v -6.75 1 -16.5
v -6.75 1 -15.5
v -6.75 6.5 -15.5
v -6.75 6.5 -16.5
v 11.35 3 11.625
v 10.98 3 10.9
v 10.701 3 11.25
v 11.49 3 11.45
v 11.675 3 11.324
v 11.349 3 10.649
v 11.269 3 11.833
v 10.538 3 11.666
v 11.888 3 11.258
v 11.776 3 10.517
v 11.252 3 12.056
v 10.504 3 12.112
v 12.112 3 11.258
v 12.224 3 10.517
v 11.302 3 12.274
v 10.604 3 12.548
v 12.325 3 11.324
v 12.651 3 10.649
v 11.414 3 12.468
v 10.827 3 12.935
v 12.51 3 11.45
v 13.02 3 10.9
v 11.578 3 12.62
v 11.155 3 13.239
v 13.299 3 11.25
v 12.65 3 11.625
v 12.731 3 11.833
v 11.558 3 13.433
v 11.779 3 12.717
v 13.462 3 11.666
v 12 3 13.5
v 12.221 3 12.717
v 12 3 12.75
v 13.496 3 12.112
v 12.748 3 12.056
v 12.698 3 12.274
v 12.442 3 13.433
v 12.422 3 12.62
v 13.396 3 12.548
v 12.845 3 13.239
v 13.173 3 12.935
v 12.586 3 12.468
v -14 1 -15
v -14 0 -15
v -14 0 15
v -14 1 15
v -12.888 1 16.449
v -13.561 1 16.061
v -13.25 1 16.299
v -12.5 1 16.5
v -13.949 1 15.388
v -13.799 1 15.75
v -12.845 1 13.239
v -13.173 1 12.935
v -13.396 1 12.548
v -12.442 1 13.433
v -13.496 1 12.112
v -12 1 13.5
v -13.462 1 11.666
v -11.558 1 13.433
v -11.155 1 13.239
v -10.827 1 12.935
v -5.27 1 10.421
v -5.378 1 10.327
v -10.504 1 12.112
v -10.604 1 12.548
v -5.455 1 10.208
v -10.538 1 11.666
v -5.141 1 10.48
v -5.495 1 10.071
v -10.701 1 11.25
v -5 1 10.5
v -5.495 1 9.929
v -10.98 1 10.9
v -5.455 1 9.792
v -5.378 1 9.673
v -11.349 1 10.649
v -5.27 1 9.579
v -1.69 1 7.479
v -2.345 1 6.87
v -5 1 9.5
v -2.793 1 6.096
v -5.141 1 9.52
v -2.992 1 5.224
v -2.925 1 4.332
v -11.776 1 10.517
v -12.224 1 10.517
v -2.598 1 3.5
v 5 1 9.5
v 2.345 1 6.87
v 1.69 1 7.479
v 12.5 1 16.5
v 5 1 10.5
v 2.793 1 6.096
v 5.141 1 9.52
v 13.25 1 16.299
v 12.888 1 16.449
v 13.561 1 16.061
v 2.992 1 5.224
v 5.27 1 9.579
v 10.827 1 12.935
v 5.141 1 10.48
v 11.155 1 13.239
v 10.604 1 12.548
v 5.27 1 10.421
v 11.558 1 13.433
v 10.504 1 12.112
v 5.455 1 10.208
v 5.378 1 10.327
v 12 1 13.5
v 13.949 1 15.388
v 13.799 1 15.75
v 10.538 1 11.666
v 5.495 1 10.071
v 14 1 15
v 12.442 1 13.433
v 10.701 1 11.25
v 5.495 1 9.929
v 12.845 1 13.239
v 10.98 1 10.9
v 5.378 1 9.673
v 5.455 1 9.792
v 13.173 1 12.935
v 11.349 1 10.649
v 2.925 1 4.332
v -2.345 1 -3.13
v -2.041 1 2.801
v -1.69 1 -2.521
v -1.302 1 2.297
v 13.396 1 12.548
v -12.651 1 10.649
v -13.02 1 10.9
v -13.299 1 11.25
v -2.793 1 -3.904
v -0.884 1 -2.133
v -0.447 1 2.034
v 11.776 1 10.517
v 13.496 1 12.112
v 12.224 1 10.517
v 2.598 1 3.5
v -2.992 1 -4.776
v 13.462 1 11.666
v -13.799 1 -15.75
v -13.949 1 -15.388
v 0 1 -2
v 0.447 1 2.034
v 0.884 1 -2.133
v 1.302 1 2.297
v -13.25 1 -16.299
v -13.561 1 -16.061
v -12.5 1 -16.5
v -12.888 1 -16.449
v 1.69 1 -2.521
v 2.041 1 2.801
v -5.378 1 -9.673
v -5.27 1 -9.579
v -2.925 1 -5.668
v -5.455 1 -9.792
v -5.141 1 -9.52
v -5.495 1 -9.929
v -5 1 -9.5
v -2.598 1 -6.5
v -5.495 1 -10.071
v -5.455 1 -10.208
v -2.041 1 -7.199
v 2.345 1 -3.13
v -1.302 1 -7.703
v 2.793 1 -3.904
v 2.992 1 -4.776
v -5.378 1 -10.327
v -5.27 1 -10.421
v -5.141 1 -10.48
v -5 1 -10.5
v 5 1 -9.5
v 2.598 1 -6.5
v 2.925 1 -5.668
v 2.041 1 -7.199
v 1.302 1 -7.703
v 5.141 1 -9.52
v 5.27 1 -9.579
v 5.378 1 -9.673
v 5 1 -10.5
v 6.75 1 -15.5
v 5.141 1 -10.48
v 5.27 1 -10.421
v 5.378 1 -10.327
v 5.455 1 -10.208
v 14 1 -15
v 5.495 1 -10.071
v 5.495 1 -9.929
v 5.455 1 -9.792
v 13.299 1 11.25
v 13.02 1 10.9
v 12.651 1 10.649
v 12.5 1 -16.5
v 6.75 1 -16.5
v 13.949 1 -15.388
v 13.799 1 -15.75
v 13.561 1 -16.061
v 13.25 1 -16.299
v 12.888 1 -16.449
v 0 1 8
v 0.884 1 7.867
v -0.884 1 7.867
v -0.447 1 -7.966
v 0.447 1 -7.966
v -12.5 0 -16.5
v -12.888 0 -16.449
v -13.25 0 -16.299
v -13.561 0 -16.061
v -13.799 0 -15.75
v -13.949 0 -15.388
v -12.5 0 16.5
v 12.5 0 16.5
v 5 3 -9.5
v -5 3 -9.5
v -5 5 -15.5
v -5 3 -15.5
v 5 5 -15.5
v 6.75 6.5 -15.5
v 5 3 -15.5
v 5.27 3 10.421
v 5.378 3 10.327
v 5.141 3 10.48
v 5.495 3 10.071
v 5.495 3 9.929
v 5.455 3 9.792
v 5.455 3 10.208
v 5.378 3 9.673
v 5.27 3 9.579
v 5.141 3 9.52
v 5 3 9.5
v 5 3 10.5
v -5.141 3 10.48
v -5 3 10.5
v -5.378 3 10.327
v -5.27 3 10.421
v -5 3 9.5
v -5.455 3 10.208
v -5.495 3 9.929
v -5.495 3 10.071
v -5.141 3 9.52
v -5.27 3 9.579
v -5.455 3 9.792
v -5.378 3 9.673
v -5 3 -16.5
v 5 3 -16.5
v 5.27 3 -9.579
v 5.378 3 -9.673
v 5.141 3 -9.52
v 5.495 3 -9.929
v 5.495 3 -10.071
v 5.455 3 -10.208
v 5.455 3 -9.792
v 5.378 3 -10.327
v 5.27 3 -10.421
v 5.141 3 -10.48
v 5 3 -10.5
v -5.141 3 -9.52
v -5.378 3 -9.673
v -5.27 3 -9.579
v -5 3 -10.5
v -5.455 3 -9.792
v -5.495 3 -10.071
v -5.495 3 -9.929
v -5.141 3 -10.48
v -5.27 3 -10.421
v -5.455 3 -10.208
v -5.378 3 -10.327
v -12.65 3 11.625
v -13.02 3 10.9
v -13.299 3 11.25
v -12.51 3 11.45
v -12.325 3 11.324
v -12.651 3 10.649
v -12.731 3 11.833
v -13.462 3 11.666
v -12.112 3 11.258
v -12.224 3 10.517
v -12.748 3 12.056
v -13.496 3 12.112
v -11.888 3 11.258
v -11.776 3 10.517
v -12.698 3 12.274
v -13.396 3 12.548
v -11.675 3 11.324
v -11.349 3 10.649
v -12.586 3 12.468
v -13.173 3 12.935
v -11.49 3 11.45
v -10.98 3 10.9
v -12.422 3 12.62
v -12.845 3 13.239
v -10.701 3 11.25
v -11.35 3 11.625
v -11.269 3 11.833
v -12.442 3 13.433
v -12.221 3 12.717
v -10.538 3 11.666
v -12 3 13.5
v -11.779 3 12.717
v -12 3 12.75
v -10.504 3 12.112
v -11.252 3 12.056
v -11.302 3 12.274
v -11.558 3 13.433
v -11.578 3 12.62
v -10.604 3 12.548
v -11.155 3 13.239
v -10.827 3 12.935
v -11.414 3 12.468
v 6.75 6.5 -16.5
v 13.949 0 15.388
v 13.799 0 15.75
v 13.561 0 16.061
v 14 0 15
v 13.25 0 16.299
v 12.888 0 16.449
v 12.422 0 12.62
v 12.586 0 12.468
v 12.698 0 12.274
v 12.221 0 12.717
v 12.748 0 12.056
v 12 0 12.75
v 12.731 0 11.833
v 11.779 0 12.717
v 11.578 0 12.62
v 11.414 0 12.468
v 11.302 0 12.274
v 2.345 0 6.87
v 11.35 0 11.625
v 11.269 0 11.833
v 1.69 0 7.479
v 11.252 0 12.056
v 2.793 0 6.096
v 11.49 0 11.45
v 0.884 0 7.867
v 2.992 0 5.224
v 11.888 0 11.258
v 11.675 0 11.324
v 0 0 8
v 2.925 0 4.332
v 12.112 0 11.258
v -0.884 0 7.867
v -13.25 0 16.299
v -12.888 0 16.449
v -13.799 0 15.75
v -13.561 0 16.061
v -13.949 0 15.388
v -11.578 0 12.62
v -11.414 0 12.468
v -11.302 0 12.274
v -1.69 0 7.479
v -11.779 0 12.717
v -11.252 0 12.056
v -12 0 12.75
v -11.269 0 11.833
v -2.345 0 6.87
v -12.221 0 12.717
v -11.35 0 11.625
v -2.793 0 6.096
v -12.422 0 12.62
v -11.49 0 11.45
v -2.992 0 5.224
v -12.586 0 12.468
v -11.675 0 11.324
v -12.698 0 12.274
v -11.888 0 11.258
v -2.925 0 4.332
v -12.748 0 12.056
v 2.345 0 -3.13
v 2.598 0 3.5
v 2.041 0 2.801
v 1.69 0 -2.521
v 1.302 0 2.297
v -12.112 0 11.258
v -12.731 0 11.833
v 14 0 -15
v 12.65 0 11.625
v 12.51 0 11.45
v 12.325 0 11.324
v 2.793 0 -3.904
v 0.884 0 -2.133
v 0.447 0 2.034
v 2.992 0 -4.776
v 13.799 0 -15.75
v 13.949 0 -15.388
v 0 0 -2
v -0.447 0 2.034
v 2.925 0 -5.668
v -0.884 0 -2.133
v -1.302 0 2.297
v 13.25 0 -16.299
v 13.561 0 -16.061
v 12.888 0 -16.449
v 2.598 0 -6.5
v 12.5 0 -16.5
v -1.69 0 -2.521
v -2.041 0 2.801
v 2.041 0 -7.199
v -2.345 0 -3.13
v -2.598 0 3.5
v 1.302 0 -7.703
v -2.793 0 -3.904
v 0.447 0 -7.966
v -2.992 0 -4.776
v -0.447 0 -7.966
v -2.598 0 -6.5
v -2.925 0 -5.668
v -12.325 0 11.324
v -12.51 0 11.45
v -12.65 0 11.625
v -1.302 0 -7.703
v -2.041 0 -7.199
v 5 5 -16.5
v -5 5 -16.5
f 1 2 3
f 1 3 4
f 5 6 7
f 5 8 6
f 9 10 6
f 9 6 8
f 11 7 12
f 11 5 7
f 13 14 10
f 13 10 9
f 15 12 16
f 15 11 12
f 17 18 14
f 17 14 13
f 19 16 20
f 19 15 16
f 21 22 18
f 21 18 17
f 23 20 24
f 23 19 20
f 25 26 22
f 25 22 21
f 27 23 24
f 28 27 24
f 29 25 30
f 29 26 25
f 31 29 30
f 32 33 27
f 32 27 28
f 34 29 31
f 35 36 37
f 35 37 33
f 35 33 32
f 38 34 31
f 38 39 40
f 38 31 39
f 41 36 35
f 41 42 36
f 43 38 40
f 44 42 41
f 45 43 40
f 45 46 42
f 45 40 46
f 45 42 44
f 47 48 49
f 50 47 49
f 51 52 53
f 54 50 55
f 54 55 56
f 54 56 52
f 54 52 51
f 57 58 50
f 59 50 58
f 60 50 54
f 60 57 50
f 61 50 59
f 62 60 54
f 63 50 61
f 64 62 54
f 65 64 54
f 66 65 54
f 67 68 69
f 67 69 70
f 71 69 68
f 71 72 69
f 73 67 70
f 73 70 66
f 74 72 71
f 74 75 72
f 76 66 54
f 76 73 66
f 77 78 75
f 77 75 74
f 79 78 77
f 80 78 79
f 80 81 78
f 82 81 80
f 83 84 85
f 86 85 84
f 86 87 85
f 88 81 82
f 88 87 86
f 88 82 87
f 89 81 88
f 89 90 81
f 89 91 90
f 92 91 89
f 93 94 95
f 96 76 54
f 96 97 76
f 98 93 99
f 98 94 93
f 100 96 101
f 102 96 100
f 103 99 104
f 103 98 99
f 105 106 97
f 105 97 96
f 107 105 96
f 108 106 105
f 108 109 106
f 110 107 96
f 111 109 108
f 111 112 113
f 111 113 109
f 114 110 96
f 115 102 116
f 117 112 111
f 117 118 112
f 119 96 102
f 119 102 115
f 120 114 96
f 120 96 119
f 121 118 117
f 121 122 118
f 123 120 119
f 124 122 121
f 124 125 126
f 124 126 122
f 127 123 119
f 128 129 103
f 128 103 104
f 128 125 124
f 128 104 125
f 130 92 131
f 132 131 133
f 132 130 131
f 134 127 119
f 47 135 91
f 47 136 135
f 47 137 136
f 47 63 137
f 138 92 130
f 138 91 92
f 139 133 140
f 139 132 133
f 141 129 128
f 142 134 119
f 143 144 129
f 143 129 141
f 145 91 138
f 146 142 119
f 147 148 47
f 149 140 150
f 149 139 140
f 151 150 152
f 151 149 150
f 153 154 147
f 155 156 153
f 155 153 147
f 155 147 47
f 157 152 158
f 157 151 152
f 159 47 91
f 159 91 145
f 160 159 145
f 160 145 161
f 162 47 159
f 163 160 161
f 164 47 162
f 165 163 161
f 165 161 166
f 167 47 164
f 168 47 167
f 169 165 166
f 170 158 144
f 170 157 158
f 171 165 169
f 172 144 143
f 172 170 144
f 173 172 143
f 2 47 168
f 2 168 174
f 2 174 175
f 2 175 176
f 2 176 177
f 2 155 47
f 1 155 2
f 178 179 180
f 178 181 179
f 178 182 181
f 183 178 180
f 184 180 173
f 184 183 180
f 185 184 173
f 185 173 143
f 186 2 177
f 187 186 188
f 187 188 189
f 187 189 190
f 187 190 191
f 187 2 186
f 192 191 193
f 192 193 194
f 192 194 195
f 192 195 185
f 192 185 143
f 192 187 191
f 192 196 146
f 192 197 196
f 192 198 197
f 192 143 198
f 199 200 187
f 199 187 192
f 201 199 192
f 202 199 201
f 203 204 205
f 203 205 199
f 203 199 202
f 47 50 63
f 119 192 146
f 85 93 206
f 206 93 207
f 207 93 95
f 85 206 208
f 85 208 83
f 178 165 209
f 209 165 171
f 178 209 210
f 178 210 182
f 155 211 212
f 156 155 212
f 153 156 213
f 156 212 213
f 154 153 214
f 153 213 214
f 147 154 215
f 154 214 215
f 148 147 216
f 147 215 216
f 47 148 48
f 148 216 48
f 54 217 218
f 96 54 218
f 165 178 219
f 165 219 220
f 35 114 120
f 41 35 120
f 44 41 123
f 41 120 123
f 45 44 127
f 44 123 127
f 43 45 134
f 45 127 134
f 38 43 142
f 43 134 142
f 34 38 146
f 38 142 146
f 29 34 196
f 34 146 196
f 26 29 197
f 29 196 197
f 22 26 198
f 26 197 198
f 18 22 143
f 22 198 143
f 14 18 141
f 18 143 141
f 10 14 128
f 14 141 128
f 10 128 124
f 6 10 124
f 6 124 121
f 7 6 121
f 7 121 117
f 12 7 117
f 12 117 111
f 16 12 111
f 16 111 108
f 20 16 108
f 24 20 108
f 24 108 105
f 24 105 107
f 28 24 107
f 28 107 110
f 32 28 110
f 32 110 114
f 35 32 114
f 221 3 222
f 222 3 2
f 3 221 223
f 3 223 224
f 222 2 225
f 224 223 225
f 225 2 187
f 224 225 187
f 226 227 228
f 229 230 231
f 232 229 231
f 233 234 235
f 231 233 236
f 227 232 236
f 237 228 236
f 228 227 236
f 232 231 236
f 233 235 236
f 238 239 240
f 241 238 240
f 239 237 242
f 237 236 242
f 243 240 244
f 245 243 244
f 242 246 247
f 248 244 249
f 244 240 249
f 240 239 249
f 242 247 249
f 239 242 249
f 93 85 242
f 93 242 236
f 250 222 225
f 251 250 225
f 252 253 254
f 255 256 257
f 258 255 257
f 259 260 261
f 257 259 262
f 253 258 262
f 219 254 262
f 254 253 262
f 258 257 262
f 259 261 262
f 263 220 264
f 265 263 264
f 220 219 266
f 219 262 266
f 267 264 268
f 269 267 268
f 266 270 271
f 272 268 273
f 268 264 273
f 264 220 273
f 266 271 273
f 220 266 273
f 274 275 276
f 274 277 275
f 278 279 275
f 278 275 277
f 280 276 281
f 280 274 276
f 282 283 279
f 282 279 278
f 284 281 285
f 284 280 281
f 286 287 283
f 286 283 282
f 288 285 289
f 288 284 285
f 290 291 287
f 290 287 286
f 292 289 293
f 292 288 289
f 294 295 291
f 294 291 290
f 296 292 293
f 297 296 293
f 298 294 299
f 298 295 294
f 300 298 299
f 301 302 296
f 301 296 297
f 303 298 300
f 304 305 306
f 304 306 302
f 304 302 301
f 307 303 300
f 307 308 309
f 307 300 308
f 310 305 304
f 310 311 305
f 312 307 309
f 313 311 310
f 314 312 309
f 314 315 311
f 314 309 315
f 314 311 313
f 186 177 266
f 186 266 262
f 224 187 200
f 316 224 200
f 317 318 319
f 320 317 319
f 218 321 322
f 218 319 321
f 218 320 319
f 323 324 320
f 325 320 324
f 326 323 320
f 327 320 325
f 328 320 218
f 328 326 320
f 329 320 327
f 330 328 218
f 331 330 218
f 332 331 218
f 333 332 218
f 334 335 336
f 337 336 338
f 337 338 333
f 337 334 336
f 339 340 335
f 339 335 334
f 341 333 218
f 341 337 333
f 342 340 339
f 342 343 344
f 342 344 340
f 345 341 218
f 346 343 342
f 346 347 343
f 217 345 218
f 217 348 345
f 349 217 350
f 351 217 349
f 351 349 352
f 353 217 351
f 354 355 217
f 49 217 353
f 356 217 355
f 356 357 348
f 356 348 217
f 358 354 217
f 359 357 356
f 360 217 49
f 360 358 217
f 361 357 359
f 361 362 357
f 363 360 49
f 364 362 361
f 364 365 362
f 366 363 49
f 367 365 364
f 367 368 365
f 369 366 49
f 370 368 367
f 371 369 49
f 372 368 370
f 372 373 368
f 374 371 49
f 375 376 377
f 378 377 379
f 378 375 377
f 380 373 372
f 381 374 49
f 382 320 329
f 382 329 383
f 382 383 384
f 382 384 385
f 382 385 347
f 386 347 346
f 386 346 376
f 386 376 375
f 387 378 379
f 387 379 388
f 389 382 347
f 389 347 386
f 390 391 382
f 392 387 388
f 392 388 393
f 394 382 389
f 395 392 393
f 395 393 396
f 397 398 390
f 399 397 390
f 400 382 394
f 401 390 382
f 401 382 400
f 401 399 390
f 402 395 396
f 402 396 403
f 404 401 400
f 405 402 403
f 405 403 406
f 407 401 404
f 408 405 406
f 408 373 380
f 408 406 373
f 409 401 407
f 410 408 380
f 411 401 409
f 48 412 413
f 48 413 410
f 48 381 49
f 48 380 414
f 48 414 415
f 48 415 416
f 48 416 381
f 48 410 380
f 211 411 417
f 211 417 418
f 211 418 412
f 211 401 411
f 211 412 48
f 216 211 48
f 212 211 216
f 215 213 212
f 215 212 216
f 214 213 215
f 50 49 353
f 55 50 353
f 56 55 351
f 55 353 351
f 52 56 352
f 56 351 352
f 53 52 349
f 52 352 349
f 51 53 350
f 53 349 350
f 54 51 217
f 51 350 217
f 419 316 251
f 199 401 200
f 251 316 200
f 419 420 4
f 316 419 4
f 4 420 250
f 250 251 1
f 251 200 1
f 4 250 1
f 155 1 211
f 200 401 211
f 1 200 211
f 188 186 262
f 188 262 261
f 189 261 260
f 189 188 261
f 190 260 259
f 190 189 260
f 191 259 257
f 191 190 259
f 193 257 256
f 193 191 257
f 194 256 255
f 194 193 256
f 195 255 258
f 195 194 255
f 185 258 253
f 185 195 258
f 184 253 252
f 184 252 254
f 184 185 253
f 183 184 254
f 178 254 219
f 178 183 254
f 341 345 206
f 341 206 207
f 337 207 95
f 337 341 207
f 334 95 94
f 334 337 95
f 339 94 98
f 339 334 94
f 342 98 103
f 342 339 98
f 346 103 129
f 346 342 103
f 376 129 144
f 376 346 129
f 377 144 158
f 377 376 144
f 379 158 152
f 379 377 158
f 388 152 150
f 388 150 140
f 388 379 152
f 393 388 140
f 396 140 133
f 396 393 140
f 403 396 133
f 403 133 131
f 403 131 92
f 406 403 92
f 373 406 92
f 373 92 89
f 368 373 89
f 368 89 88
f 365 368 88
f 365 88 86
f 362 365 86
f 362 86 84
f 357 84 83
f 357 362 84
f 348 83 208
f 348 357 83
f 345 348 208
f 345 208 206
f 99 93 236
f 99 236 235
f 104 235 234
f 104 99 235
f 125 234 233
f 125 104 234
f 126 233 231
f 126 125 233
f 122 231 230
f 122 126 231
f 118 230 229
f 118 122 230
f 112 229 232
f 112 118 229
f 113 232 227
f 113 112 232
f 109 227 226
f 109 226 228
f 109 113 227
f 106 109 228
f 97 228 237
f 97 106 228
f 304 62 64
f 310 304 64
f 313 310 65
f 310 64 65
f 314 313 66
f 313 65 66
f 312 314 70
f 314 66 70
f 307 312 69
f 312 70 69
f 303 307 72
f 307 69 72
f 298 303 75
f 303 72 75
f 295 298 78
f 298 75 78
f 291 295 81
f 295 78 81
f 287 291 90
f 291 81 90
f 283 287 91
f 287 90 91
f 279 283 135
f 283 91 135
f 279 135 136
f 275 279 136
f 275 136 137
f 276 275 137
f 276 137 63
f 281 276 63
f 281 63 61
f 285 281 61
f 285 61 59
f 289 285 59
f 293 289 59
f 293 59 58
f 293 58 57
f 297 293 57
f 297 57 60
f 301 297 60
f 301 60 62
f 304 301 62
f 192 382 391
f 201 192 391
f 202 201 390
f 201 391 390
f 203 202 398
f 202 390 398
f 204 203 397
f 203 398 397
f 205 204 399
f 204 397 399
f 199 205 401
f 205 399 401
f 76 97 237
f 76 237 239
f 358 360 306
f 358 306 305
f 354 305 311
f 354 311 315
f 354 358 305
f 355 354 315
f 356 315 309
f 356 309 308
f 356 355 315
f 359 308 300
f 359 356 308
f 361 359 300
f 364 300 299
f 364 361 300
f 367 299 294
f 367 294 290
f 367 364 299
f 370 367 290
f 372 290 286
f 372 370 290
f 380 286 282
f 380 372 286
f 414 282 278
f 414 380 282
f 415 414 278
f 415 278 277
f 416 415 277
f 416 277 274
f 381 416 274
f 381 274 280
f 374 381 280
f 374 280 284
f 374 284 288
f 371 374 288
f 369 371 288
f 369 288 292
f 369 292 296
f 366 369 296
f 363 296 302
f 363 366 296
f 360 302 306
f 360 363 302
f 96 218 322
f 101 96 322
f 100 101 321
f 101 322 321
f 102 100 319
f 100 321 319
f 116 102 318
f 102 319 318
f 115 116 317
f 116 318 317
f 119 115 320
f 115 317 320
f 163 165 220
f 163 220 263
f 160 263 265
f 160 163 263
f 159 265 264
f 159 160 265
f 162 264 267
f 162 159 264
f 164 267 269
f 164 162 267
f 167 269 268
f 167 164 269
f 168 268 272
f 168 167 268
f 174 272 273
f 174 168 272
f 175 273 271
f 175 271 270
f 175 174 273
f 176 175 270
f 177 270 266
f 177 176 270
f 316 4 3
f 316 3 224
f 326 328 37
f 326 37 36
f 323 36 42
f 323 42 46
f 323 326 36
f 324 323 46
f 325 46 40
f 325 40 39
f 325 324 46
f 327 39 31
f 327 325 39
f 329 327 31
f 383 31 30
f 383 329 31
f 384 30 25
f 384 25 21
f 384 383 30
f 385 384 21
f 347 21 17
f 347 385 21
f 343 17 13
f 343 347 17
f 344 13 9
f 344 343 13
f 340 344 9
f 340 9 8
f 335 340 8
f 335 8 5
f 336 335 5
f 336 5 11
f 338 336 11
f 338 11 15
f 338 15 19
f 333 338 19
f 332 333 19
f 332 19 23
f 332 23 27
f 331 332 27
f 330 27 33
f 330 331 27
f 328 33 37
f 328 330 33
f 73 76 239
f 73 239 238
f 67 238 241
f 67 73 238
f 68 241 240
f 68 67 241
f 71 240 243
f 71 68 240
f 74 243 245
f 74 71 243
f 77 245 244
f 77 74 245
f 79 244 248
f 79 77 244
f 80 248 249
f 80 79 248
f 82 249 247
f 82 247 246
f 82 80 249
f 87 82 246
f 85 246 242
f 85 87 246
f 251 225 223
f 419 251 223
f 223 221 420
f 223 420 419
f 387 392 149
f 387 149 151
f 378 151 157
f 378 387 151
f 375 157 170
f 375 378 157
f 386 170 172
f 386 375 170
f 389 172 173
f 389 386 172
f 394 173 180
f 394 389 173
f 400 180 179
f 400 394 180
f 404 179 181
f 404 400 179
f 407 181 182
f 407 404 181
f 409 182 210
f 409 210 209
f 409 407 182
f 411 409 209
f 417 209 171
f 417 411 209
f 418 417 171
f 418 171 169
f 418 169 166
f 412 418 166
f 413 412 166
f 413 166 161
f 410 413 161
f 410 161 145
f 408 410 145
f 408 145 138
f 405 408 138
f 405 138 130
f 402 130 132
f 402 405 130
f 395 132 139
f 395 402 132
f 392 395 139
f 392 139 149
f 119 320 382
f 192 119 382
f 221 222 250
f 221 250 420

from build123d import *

# Parameters (mm, degrees)
BASE_4_R              = 1.5
BASE_4_R_2            = 0.75
BOSS_EXTRUDE5_DEPTH   = 3
BOSS_EXTRUDE5_2_DEPTH = 3
BASE_W                = 13.5
BASE_H                = 1
BOSS_EXTRUDE7_DEPTH   = 6.5
BASE_7_R              = 1.5
BASE_7_R_2            = 3
BOSS_EXTRUDE8_DEPTH   = 1
BOSS_EXTRUDE9_DEPTH   = 3
SLIT_W                = 10
SLIT_H                = 2
CUT_EXTRUDE2_DEPTH    = 6.5


with BuildPart() as part:
    # Base<4> → Boss-Extrude5 (new body)
    with BuildSketch(Plane(origin=(0, 0, 0), x_dir=(1, 0, 0), z_dir=(0, 1, 0))):
        with Locations((-12, -12)):
            Circle(BASE_4_R)
        with Locations((-12, -12)):
            Circle(BASE_4_R_2, mode=Mode.SUBTRACT)
    extrude(amount=BOSS_EXTRUDE5_DEPTH)



with BuildPart() as body_2:
    # Base<4> → Boss-Extrude5 2 (new body)
    with BuildSketch(Plane(origin=(0, 0, 0), x_dir=(1, 0, 0), z_dir=(0, 1, 0))):
        with Locations((12, -12)):
            Circle(BASE_4_R)
        with Locations((12, -12)):
            Circle(BASE_4_R_2, mode=Mode.SUBTRACT)
    extrude(amount=BOSS_EXTRUDE5_2_DEPTH)


with BuildPart() as body_3:
    # Base → Boss-Extrude7 (new body)
    with BuildSketch(Plane(origin=(0, 0, 0), x_dir=(1, 0, 0), z_dir=(0, 1, 0))):
        with Locations((0, 16)):
            Rectangle(BASE_W, BASE_H)
    extrude(amount=BOSS_EXTRUDE7_DEPTH)


with BuildPart() as part_1:
    add(part.part)

    add(body_2.part)  # Boss-Extrude8 merges body 2

    add(body_3.part)  # Boss-Extrude8 merges body 3
    # Base<7> → Boss-Extrude8 (add)
    with BuildSketch(Plane(origin=(0, 0, 0), x_dir=(1, 0, 0), z_dir=(0, 1, 0))):
        with BuildLine():
            ThreePointArc((14, 15), (13.560660172, 16.060660172), (12.5, 16.5))
            Line((12.5, 16.5), (6.75, 16.5))
            Line((6.75, 16.5), (6.75, 15.5))
            Line((6.75, 15.5), (-6.75, 15.5))
            Line((-6.75, 15.5), (-6.75, 16.5))
            Line((-6.75, 16.5), (-12.5, 16.5))
            ThreePointArc((-12.5, 16.5), (-13.560660172, 16.060660172), (-14, 15))
            Line((-14, 15), (-14, -15))
            ThreePointArc((-14, -15), (-13.560660172, -16.060660172), (-12.5, -16.5))
            Line((-12.5, -16.5), (12.5, -16.5))
            ThreePointArc((12.5, -16.5), (13.560660172, -16.060660172), (14, -15))
            Line((14, -15), (14, 15))
        make_face()
        with Locations((-12, -12)):
            Circle(BASE_7_R, mode=Mode.SUBTRACT)
        with Locations((0, -5)):
            Circle(BASE_7_R_2, mode=Mode.SUBTRACT)
        with Locations((12, -12)):
            Circle(BASE_7_R, mode=Mode.SUBTRACT)
        with Locations((0, 5)):
            Circle(BASE_7_R_2, mode=Mode.SUBTRACT)
    extrude(amount=BOSS_EXTRUDE8_DEPTH)

    # Base<8> → Boss-Extrude9 (add)
    with BuildSketch(Plane(origin=(0, 0, 0), x_dir=(1, 0, 0), z_dir=(0, 1, 0))):
        with BuildLine():
            Line((-5, -9.5), (5, -9.5))
            ThreePointArc((5, -9.5), (5.5, -10), (5, -10.5))
            Line((5, -10.5), (-5, -10.5))
            ThreePointArc((-5, -10.5), (-5.5, -10), (-5, -9.5))
        make_face()
        with BuildLine():
            Line((-5, 10.5), (5, 10.5))
            ThreePointArc((5, 10.5), (5.5, 10), (5, 9.5))
            Line((5, 9.5), (-5, 9.5))
            ThreePointArc((-5, 9.5), (-5.5, 10), (-5, 10.5))
        make_face()
    extrude(amount=BOSS_EXTRUDE9_DEPTH)

    # slit → Cut-Extrude2 (cut)
    with BuildSketch(Plane.XY.offset(-15.5)):
        with Locations((0, 4)):
            Rectangle(SLIT_W, SLIT_H)
    extrude(amount=-CUT_EXTRUDE2_DEPTH, mode=Mode.SUBTRACT)


solid = part_1.part
